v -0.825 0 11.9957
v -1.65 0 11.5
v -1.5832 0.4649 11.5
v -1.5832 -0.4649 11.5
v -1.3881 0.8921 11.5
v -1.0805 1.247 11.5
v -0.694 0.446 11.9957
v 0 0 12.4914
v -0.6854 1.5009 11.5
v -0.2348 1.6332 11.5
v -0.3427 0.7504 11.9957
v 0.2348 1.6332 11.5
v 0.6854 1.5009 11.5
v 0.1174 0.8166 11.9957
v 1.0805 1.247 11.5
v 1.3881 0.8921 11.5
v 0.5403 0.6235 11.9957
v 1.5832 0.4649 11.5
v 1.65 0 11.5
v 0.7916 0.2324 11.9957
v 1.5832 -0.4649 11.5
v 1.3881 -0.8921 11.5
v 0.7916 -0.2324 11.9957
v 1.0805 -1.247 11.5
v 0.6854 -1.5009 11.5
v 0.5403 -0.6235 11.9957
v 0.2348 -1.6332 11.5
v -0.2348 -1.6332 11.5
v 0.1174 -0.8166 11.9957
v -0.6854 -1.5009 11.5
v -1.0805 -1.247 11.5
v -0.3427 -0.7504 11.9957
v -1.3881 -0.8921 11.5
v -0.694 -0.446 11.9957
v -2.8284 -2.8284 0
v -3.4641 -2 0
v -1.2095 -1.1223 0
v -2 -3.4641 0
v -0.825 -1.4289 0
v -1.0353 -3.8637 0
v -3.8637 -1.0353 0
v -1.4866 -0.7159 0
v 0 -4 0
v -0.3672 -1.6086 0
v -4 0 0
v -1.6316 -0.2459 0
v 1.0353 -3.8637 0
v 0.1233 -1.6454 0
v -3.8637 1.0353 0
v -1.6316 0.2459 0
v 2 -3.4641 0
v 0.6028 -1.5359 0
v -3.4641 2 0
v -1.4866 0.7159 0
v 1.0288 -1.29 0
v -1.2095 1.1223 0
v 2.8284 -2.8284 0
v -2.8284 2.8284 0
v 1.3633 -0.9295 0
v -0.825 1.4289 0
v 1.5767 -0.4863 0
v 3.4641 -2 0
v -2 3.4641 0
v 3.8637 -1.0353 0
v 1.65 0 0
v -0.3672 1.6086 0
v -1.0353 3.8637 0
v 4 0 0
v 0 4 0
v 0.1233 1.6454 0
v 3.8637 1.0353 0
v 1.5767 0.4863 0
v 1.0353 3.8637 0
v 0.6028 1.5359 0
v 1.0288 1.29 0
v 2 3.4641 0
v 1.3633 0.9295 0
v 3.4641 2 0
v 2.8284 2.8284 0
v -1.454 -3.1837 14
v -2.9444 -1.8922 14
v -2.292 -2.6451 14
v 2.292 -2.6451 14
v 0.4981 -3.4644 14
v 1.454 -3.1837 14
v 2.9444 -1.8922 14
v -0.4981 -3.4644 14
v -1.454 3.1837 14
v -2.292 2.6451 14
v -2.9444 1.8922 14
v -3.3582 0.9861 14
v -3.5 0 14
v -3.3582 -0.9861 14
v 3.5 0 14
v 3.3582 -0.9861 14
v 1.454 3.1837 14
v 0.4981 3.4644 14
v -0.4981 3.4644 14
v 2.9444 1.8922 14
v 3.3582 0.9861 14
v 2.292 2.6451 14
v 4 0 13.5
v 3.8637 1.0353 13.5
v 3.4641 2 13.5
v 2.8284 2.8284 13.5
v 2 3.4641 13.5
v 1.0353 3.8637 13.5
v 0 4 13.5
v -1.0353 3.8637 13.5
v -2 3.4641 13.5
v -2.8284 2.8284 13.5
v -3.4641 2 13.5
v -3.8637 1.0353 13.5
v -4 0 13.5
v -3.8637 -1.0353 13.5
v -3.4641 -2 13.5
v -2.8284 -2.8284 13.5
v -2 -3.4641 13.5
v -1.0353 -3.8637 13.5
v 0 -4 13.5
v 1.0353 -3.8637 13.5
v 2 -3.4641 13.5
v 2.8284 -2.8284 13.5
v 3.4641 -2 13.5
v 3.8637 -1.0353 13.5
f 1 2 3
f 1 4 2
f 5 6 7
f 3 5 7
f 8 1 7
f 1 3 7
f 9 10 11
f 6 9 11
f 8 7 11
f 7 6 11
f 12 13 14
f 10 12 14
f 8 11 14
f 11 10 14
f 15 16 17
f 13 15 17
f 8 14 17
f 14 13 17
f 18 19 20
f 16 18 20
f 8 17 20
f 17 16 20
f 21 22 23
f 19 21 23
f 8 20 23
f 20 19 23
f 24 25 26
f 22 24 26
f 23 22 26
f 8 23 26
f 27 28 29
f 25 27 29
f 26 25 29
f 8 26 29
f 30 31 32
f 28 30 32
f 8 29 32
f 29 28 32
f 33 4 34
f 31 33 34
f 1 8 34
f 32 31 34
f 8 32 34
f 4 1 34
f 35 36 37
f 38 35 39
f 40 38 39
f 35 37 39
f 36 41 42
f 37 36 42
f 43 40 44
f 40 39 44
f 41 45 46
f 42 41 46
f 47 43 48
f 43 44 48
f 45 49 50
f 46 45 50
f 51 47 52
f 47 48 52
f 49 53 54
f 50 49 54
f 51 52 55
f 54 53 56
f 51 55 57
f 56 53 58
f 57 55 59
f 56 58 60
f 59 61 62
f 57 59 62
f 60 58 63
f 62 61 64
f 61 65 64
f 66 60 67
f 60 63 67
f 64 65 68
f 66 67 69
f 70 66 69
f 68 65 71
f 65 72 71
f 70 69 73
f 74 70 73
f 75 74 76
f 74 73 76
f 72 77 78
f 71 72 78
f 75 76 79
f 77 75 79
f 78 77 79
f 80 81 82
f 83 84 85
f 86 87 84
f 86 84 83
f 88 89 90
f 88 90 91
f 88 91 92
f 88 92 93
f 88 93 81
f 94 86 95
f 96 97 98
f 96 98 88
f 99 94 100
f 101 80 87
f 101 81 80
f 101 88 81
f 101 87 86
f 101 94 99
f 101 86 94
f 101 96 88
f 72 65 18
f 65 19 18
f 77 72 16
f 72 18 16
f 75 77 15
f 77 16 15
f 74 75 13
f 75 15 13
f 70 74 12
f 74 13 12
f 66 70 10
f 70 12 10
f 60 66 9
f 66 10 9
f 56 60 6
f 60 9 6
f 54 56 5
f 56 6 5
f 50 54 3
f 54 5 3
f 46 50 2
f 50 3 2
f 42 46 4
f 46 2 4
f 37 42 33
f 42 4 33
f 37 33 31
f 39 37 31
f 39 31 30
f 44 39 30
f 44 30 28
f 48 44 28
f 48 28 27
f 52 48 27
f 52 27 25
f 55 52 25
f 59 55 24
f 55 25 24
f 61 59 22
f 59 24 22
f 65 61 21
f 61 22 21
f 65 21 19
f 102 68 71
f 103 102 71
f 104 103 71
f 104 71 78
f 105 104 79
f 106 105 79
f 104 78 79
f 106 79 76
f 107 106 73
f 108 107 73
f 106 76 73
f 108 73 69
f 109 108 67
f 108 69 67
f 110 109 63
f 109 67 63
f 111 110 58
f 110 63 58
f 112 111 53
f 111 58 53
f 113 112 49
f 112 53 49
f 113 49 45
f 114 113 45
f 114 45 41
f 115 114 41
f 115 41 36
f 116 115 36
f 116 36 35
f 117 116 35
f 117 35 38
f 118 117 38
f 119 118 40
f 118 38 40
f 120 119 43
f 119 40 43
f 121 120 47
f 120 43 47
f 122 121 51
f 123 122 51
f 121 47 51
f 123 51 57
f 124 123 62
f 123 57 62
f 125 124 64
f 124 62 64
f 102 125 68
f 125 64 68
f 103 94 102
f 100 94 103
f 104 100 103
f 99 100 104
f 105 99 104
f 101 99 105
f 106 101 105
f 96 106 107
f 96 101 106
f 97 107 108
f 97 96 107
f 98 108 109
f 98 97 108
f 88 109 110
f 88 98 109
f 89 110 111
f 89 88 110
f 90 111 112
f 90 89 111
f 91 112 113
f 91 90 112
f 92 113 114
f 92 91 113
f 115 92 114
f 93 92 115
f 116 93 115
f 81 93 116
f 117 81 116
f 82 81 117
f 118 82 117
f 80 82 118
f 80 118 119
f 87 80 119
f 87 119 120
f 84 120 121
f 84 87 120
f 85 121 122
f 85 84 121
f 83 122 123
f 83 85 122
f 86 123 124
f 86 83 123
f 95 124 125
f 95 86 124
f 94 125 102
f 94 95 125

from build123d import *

# Parameters (mm, degrees)
ESQUISSE1_R           = 4
BOSS_EXTRU_1_DEPTH    = 14
CHANFREIN1_SIZE       = 0.5
TROU_TARAUD_M41_D     = 3.3
TROU_TARAUD_M41_DEPTH = 11.5
TROU_TARAUD_M41_TIP   = 0.991420021


with BuildPart() as part:
    # Esquisse1 → Boss.-Extru.1 (new body)
    with BuildSketch(Plane.XY):
        Circle(ESQUISSE1_R)
    extrude(amount=BOSS_EXTRU_1_DEPTH)

    # Chanfrein1
    chanfrein1_edges = [part.edges().sort_by_distance(p)[0] for p in [
        (-4, 0, 14),
    ]]
    chamfer(chanfrein1_edges, length=CHANFREIN1_SIZE)

    # Trou taraudé M41
    with Locations(Plane(origin=(0, 0, 0), x_dir=(-1, 0, 0), z_dir=(0, 0, -1))):
        with Locations((0, 0)):
            Hole(TROU_TARAUD_M41_D / 2, depth=TROU_TARAUD_M41_DEPTH)
            with Locations((0, 0, -(TROU_TARAUD_M41_DEPTH + TROU_TARAUD_M41_TIP / 2))):  # 118° drill point
                Cone(0, TROU_TARAUD_M41_D / 2, TROU_TARAUD_M41_TIP, mode=Mode.SUBTRACT)


solid = part.part
